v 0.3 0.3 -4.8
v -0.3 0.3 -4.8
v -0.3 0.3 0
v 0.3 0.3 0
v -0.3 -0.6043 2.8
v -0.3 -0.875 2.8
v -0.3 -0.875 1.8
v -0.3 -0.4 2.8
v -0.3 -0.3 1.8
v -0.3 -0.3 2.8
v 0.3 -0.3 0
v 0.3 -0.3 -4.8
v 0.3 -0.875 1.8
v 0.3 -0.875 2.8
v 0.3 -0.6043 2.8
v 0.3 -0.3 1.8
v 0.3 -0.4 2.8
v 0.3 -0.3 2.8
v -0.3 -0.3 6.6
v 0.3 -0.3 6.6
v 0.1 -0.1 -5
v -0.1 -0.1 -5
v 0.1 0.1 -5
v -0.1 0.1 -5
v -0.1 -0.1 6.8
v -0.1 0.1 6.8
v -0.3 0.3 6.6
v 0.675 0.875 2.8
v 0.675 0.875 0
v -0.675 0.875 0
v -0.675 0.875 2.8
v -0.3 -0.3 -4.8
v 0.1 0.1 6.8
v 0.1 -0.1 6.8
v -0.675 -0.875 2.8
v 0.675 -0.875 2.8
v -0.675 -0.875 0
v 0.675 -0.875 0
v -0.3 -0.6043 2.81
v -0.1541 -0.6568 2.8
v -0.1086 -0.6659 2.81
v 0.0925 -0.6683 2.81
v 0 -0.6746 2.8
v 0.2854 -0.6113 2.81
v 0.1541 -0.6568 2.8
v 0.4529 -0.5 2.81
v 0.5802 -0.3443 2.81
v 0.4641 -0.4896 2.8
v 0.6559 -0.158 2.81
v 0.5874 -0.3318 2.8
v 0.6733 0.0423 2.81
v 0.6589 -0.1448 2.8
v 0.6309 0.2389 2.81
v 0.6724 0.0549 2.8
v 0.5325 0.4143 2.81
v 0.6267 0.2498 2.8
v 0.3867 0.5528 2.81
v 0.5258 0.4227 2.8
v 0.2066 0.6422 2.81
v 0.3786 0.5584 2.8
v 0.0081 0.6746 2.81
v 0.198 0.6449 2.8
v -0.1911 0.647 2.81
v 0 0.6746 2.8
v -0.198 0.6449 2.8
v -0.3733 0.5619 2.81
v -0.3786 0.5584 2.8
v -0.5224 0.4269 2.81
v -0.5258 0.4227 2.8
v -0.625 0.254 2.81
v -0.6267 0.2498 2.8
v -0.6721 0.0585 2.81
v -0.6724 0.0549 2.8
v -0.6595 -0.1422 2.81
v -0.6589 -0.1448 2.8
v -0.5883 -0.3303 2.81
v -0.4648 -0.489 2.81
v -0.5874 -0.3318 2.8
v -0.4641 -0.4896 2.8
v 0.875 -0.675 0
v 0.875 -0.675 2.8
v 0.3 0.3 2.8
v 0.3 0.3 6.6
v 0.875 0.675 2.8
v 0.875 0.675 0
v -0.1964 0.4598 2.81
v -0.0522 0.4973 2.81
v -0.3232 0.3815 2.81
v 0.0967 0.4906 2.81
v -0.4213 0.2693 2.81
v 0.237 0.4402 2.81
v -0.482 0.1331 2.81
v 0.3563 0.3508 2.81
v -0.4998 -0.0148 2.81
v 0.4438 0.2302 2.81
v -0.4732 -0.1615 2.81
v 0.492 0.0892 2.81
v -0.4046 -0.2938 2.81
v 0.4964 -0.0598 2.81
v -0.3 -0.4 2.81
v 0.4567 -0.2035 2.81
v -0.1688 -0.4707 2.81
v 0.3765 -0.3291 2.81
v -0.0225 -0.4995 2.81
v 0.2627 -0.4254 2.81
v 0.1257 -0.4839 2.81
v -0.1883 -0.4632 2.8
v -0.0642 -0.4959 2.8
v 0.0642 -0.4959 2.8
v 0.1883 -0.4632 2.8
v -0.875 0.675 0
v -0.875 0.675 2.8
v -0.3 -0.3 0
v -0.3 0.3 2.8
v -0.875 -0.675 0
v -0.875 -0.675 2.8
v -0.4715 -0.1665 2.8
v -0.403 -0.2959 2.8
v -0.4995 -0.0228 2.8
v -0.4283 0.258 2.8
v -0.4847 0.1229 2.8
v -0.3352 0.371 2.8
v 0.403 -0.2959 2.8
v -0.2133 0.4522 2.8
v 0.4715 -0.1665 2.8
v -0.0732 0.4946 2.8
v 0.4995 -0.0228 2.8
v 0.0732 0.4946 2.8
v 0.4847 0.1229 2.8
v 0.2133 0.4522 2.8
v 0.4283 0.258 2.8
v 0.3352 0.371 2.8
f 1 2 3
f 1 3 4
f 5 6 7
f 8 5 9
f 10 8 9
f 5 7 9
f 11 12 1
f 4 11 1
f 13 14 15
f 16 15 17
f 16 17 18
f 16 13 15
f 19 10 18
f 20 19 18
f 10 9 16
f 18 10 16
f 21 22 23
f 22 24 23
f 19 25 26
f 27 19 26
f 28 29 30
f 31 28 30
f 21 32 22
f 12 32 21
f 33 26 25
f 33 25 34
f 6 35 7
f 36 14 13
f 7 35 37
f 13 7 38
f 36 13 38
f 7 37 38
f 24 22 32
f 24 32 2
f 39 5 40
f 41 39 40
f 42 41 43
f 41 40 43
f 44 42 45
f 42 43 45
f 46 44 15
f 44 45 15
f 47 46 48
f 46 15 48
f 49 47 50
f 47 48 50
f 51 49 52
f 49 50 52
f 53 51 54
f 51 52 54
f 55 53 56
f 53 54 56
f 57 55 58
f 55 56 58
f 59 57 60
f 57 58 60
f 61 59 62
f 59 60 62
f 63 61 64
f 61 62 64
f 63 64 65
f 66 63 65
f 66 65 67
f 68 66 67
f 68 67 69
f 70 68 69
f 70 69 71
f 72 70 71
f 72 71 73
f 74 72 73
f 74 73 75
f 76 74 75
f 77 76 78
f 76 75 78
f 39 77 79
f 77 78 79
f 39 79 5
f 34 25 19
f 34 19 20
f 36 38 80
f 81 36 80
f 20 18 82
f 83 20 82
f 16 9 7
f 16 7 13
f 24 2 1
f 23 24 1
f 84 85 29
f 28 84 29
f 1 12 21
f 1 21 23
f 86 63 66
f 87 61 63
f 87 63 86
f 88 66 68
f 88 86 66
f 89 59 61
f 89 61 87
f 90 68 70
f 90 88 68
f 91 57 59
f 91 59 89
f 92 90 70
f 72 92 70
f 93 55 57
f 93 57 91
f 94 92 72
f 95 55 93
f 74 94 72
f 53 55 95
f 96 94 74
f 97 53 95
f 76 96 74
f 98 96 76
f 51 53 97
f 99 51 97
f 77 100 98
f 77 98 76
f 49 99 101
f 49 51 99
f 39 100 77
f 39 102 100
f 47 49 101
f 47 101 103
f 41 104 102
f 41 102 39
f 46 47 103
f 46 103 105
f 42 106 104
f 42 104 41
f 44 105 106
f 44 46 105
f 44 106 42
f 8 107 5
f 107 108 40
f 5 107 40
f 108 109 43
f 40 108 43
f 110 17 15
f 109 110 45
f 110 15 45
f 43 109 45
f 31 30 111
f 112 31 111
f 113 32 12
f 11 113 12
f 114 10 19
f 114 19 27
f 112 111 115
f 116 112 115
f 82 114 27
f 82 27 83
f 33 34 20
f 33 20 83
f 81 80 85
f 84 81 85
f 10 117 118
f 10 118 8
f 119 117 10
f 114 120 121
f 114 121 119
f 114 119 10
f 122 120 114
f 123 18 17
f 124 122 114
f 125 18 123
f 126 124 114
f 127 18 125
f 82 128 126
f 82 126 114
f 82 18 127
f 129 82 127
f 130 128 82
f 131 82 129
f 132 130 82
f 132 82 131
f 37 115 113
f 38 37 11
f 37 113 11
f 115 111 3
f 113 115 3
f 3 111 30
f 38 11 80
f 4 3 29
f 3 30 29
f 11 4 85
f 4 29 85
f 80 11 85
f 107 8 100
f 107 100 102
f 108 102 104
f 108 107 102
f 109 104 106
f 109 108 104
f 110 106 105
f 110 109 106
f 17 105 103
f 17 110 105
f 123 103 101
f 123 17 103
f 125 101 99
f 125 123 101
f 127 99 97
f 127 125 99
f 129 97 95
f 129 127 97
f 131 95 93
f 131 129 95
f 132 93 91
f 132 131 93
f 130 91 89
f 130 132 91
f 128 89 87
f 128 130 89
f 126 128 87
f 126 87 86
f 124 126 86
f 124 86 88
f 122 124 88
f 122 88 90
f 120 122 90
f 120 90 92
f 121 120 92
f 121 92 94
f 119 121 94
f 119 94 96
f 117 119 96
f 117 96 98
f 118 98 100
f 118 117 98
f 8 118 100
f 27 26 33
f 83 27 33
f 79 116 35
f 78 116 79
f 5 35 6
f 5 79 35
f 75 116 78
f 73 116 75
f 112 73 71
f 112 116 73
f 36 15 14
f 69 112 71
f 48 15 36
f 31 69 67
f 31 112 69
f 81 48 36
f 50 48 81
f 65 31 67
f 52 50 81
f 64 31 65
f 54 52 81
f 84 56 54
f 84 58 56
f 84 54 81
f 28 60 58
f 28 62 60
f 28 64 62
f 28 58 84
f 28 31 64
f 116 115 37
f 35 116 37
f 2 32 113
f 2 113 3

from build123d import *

# Parameters (mm, degrees)
ESQUISSE1_W             = 0.6
ESQUISSE1_H             = 0.6
BOSS_EXTRU_1_DEPTH      = 2.8
ESQUISSE2_W             = 0.6
ESQUISSE2_H             = 0.575
ENL_V_MAT_EXTRU_1_DEPTH = 1
BOSS_EXTRU_2_DEPTH      = 4
BOSS_EXTRU_2_DEPTH_BACK = 7.8
ESQUISSE3_W             = 0.6
ESQUISSE3_H             = 0.6
CHANFREIN1_SIZE         = 0.2
ESQUISSE4_R             = 0.674645205
ESQUISSE4_R_2           = 0.5
BOSS_EXTRU_3_DEPTH      = 0.01


with BuildPart() as part:
    # Esquisse1 → Boss.-Extru.1 (new body)
    with BuildSketch(Plane.XY):
        Polygon((-0.675, 0.875), (-0.875, 0.675), (-0.875, -0.675), (-0.675, -0.875), (0.675, -0.875), (0.875, -0.675), (0.875, 0.675), (0.675, 0.875), align=None)
        Rectangle(ESQUISSE1_W, ESQUISSE1_H, mode=Mode.SUBTRACT)
    extrude(amount=BOSS_EXTRU_1_DEPTH)

    # Esquisse2 → Enlèv. mat.-Extru.1 (cut)
    with BuildSketch(Plane.XY.offset(2.8)):
        with Locations((0, -0.5875)):
            Rectangle(ESQUISSE2_W, ESQUISSE2_H)
    extrude(amount=-ENL_V_MAT_EXTRU_1_DEPTH, mode=Mode.SUBTRACT)

    # Esquisse3 → Boss.-Extru.2 (add, two sides: drawn at the far end of the back side and taken through both)
    with BuildSketch(Plane.XY.offset(2.8).offset(-BOSS_EXTRU_2_DEPTH_BACK)):
        Rectangle(ESQUISSE3_W, ESQUISSE3_H)
    extrude(amount=BOSS_EXTRU_2_DEPTH + BOSS_EXTRU_2_DEPTH_BACK)

    # Chanfrein1
    chanfrein1_edges = [part.edges().sort_by_distance(p)[0] for p in [
        (0, -0.3, -5),
        (0.3, 0, -5),
        (-0.3, 0, -5),
        (0, 0.3, -5),
        (0.3, 0, 6.8),
        (0, 0.3, 6.8),
        (-0.3, 0, 6.8),
        (0, -0.3, 6.8),
    ]]
    chamfer(chanfrein1_edges, length=CHANFREIN1_SIZE)

    # Esquisse4 → Boss.-Extru.3 (add)
    with BuildSketch(Plane.XY.offset(2.8)):
        with Locations(Location((0, 0, 0), (0, 0, 243.597249523))):
            Circle(ESQUISSE4_R)
        with Locations(Location((0, 0, 0), (0, 0, 233.130102354))):
            Circle(ESQUISSE4_R_2, mode=Mode.SUBTRACT)
    extrude(amount=BOSS_EXTRU_3_DEPTH)


solid = part.part
